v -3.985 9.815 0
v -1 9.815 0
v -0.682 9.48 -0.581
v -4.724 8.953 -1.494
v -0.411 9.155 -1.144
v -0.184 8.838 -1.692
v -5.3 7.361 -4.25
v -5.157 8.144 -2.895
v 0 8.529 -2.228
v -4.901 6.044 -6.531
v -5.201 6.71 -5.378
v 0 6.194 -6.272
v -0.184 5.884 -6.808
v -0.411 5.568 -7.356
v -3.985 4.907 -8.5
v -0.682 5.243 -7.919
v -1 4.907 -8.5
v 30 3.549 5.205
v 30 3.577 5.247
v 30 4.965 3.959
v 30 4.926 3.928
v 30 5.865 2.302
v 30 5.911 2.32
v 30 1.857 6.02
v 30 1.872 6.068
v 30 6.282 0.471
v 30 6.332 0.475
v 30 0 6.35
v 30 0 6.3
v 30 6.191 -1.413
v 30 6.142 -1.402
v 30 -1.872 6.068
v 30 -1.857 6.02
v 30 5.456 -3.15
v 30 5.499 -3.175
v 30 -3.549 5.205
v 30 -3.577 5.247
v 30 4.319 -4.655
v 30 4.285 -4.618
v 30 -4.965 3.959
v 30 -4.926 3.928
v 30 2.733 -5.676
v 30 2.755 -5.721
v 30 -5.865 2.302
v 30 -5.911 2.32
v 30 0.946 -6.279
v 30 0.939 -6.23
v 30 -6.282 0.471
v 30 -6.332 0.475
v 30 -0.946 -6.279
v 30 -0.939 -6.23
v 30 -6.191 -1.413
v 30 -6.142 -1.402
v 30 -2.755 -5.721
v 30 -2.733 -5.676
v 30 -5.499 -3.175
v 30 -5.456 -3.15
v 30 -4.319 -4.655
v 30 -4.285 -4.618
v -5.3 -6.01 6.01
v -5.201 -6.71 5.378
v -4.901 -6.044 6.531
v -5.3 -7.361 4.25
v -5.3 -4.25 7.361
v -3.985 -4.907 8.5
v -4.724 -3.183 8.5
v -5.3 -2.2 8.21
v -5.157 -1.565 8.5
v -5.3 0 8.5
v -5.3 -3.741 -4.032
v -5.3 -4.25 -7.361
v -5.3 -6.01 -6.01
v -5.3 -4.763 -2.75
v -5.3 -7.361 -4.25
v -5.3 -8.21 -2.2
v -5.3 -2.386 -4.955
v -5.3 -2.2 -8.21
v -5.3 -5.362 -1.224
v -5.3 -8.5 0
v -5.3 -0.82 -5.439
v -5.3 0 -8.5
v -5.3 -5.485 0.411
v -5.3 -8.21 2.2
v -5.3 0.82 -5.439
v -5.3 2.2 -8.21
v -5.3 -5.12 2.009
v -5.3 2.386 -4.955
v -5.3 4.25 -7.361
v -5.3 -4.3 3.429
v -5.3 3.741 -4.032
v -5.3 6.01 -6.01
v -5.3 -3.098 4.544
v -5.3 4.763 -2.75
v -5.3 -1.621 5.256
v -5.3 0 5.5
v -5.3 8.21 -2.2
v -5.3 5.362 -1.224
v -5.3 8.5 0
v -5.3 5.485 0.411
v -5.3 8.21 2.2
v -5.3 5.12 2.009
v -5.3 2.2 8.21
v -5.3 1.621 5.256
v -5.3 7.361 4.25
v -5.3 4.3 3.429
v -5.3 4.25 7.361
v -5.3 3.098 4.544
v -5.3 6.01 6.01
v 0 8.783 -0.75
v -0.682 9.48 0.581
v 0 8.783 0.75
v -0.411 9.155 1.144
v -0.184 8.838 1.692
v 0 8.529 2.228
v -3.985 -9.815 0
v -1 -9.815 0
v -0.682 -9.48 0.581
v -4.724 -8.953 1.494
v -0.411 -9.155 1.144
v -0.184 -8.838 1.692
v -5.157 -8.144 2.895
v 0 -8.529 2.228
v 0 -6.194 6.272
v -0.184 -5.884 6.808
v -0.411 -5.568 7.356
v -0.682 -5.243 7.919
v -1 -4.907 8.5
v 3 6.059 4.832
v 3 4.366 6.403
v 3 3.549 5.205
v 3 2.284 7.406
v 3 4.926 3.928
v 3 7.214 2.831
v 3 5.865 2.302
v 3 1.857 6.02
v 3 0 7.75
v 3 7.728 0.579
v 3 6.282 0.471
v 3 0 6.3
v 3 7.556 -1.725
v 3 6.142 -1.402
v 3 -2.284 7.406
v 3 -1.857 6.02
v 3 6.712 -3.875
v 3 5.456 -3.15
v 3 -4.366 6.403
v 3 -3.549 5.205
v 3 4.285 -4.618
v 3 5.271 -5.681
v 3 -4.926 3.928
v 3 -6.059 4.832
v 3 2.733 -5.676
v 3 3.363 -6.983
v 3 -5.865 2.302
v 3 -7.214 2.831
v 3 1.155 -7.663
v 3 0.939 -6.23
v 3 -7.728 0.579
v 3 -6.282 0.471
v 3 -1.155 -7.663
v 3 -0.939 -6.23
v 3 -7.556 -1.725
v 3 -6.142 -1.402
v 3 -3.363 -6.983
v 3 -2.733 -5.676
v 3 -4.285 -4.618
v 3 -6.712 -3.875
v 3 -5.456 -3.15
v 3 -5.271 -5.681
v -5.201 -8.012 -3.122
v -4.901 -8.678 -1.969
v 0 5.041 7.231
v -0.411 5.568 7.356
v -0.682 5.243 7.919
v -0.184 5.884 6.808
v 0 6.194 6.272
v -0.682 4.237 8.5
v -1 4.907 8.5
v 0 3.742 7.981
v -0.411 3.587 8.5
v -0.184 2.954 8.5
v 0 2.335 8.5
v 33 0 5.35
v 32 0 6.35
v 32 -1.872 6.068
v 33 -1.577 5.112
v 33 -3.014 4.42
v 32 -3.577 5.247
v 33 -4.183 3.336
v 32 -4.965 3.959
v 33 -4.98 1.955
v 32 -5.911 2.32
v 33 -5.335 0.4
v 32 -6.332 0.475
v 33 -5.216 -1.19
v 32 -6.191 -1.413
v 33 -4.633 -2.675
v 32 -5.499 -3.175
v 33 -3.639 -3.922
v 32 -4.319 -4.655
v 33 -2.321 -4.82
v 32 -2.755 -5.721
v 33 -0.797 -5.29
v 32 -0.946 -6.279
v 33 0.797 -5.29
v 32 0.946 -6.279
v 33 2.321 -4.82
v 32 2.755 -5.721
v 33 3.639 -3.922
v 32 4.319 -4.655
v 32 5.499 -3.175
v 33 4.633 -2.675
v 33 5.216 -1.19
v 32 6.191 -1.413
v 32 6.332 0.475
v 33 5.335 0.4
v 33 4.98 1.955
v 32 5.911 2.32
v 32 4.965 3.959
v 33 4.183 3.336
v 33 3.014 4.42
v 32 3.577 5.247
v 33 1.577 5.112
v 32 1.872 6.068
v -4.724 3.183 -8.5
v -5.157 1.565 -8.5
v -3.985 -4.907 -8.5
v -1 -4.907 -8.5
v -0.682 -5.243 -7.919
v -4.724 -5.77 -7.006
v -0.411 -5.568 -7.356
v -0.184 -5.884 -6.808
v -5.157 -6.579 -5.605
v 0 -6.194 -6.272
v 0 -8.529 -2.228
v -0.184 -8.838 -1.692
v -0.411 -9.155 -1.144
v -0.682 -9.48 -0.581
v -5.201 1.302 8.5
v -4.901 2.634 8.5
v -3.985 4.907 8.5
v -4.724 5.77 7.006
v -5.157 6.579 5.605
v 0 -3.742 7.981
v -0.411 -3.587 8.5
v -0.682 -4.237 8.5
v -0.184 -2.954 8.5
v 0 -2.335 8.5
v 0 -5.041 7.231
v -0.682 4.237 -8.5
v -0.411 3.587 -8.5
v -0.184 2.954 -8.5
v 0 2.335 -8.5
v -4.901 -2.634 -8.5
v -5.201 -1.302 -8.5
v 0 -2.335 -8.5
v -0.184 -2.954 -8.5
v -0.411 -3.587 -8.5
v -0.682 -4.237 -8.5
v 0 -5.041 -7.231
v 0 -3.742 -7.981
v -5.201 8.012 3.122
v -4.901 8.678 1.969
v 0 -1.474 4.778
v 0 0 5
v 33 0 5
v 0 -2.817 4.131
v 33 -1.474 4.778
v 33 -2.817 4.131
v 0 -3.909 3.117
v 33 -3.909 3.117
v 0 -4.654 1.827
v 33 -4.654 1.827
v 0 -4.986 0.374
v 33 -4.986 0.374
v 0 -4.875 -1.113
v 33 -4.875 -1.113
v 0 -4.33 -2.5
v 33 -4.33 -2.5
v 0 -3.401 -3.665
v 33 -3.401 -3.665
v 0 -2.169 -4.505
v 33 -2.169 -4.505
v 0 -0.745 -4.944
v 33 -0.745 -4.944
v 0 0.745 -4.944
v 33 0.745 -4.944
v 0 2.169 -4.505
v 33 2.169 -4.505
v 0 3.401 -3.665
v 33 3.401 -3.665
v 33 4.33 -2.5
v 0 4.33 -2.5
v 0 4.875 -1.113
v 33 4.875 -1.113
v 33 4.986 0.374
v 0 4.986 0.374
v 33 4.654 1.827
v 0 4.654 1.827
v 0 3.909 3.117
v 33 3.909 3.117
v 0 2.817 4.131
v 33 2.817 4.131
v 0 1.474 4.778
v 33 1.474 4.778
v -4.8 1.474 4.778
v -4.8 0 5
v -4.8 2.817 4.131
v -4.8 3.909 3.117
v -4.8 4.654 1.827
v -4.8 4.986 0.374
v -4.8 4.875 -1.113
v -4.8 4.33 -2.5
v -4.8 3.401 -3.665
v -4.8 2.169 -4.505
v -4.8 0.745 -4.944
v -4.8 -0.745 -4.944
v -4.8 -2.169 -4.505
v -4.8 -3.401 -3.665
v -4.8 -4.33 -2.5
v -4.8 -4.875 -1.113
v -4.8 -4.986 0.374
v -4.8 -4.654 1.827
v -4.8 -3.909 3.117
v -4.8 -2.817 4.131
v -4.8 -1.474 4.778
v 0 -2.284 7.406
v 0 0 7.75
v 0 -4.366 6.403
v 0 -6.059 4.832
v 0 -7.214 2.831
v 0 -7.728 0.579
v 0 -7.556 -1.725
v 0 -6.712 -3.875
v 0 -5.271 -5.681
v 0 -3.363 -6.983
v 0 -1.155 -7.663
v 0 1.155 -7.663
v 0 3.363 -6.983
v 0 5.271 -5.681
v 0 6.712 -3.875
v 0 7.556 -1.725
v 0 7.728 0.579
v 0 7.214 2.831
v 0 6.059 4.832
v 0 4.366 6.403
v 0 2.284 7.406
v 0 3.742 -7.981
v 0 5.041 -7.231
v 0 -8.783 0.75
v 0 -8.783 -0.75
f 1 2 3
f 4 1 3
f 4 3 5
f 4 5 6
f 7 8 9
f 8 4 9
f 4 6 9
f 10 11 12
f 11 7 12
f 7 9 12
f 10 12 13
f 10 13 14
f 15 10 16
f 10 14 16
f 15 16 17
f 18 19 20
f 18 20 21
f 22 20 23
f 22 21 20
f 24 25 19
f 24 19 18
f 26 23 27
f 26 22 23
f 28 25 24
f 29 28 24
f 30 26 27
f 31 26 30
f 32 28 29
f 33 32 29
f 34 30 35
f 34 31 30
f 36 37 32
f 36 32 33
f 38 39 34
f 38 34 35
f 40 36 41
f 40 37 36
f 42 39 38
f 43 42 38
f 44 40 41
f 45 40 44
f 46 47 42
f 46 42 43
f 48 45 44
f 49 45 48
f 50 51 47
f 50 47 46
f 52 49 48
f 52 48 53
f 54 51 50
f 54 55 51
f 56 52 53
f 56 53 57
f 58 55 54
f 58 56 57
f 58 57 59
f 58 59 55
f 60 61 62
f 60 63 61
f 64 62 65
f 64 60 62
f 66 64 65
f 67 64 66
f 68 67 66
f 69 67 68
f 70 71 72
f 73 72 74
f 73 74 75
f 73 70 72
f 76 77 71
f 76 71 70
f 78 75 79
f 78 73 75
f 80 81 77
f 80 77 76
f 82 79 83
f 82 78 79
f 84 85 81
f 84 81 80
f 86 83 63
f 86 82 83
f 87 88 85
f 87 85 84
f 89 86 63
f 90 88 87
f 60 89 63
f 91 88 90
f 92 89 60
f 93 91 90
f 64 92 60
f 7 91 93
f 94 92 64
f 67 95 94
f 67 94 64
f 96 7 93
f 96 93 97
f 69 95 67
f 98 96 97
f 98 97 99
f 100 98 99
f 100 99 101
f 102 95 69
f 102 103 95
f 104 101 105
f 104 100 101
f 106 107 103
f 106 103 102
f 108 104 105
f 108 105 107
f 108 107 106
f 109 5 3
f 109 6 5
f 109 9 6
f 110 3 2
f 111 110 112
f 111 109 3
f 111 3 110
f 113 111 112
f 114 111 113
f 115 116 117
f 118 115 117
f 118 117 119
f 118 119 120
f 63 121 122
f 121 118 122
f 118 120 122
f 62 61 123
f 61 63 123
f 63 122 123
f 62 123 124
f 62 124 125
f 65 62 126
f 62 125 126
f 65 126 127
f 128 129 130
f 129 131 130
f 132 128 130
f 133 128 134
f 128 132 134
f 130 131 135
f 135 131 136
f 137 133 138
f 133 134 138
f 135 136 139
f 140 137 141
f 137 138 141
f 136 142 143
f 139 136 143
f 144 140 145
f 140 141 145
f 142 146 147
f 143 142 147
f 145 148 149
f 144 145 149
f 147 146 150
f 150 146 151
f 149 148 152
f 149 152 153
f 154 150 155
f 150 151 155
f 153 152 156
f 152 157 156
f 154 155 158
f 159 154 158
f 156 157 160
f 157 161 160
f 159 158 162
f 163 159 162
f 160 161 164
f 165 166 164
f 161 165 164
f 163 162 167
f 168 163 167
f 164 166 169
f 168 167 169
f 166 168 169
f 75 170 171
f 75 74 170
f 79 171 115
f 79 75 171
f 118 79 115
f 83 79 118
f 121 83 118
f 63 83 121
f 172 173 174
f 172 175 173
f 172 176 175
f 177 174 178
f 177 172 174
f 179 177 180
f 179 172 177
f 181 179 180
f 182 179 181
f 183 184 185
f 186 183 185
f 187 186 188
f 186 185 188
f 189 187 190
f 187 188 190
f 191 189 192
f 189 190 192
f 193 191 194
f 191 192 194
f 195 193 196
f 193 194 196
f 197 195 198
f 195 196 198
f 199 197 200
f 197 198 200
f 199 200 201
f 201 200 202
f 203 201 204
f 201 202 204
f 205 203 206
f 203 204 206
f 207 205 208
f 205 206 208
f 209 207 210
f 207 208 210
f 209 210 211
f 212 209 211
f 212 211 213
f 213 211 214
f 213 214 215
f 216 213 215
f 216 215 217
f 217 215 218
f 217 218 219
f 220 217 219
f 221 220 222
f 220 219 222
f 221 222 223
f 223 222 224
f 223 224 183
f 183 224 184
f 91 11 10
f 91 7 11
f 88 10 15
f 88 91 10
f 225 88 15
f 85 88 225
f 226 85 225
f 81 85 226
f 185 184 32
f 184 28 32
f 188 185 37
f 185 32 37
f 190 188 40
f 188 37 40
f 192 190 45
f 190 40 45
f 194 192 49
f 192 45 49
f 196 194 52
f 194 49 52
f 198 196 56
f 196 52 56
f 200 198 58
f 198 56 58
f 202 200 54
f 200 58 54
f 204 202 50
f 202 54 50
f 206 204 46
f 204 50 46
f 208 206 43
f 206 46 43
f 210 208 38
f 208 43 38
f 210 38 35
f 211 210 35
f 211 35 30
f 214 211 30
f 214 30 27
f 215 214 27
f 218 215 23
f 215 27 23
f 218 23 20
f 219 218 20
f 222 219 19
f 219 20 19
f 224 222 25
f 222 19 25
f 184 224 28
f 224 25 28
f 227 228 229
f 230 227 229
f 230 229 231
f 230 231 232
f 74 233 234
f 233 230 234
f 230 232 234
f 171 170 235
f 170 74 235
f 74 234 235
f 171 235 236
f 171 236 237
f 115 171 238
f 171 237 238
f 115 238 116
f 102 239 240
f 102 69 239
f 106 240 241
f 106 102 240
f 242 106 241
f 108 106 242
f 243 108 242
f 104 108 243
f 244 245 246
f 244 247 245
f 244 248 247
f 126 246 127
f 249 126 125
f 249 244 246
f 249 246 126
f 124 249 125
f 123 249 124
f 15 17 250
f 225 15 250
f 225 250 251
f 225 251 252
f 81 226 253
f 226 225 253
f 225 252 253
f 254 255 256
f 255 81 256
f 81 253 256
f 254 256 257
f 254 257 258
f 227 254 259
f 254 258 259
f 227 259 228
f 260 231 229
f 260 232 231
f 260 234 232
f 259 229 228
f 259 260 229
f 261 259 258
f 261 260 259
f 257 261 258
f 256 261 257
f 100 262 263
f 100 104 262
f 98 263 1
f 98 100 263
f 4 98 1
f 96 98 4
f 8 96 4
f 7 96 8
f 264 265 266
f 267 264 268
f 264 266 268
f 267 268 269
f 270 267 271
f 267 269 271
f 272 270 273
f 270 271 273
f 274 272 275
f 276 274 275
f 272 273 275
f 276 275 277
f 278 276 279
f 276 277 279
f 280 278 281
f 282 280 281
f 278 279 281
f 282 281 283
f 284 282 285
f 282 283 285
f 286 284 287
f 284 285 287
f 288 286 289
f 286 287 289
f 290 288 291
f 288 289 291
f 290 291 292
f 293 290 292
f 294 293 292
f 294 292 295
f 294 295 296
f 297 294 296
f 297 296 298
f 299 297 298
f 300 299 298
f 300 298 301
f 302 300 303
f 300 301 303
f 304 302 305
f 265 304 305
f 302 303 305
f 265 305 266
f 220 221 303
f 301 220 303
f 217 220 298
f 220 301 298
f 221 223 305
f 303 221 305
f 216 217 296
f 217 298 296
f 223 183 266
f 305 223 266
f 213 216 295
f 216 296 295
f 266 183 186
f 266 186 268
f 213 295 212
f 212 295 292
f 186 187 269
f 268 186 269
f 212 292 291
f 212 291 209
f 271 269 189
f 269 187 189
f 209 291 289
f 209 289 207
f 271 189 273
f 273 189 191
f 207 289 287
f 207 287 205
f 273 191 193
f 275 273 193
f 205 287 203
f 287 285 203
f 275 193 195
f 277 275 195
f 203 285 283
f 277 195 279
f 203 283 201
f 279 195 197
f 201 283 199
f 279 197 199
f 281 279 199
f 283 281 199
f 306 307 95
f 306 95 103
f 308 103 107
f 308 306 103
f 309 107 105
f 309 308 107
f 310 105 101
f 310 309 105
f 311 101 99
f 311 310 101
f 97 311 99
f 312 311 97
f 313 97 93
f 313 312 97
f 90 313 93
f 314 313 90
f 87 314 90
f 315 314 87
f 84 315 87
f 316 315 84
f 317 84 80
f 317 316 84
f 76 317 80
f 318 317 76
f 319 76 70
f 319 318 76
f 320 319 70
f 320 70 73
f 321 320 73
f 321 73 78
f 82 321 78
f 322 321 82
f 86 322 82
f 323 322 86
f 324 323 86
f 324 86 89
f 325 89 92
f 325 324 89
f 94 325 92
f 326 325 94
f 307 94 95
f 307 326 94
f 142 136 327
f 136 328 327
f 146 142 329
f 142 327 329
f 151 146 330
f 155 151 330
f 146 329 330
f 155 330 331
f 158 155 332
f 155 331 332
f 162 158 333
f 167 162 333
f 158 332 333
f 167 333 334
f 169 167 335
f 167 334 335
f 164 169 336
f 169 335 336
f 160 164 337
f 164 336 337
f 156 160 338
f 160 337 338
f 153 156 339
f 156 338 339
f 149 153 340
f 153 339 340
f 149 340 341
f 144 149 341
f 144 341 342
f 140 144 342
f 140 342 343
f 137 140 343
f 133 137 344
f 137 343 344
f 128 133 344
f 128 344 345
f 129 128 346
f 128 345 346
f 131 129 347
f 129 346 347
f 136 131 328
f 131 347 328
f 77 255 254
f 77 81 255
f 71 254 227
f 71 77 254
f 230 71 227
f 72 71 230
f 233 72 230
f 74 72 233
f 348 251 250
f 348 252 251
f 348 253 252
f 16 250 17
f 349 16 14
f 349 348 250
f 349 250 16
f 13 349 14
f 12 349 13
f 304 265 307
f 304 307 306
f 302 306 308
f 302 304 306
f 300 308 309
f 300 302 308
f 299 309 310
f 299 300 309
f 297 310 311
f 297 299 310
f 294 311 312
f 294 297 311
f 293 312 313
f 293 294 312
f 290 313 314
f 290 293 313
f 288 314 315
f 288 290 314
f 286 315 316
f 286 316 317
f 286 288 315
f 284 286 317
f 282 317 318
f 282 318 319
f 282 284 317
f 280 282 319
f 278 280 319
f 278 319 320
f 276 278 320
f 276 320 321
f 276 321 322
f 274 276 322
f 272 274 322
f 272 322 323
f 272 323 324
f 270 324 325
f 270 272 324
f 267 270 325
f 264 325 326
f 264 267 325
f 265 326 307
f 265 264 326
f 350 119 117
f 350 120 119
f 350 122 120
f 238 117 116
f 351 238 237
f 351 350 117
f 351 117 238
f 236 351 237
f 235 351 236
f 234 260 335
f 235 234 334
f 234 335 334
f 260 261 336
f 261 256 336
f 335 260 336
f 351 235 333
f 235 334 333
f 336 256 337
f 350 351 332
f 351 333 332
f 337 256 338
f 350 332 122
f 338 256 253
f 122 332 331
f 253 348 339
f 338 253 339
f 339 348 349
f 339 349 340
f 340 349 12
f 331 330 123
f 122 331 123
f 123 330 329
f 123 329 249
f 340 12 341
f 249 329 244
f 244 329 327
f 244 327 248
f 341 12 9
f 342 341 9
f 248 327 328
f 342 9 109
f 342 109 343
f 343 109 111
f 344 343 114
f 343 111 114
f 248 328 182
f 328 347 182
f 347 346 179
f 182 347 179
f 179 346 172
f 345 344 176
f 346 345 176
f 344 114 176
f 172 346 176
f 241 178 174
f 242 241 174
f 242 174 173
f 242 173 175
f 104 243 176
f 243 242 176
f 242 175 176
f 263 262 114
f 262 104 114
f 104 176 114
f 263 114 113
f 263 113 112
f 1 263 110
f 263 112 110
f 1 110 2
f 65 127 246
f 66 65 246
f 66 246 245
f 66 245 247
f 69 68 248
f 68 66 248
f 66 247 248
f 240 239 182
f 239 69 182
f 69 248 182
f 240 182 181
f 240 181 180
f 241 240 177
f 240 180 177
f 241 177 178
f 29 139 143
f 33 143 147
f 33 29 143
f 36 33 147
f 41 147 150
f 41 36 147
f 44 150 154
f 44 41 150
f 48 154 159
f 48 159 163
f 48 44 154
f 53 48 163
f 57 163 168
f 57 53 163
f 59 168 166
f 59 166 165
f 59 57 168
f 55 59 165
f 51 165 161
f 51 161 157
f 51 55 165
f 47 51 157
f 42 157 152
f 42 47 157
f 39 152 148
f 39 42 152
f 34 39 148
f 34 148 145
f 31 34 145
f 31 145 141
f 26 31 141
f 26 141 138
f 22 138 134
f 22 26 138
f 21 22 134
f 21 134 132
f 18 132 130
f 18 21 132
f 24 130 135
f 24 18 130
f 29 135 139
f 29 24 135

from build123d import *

# Parameters (mm, degrees)
SFAZOWANIE2_SIZE            = 1
SZKIC2_W                    = 27
SZKIC2_H                    = 0.05
SZKIC3_R                    = 5
DODANIE_WYCI_GNI_CIE1_DEPTH = 5.3
SFAZOWANIE3_SIZE            = 0.5


with BuildPart() as part:
    # Szkic1 → Obrót1 (revolve)
    with BuildSketch(Plane.XY, mode=Mode.PRIVATE) as obr_t1_sk:
        Polygon((0, 5), (33, 5), (33, 6.35), (3, 6.35), (3, 7.75), (0, 7.75), align=None)
    revolve(obr_t1_sk.sketch.rotate(Axis((0, 0, 0), (1, 0, 0)), 90), axis=Axis((0, 0, 0), (1, 0, 0)))

    # Sfazowanie2
    sfazowanie2_edges = [part.edges().sort_by_distance(p)[0] for p in [
        (33, 0, -6.35),
    ]]
    chamfer(sfazowanie2_edges, length=SFAZOWANIE2_SIZE)

    # Szkic2 → Wycięcie-obrót1 (revolve, cut)
    with BuildSketch(Plane.XY, mode=Mode.PRIVATE) as wyci_cie_obr_t1_sk:
        with Locations((16.5, 6.325)):
            Rectangle(SZKIC2_W, SZKIC2_H)
    revolve(wyci_cie_obr_t1_sk.sketch.rotate(Axis((3, 0, 0), (1, 0, 0)), 90), axis=Axis((3, 0, 0), (1, 0, 0)), mode=Mode.SUBTRACT)

    # Szkic3 → Dodanie-wyciągnięcie1 (add)
    with BuildSketch(Plane.ZY):
        Polygon((8.5, -4.907477288), (8.5, 4.907477288), (0, 9.814954576), (-8.5, 4.907477288), (-8.5, -4.907477288), (0, -9.814954576), align=None)
        Circle(SZKIC3_R, mode=Mode.SUBTRACT)
    extrude(amount=DODANIE_WYCI_GNI_CIE1_DEPTH)

    # Szkic4 → Wycięcie-obrót2 (revolve, cut)
    with BuildSketch(Plane(origin=(0, 0, 0), x_dir=(1, 0, 0), z_dir=(0, 1, 0)), mode=Mode.PRIVATE) as wyci_cie_obr_t2_sk:
        Polygon((-5.3, 8.5), (-5.3, 12), (-1.8, 12), align=None)
    revolve(wyci_cie_obr_t2_sk.sketch.rotate(Axis((0, 0, 0), (-1, 0, 0)), 180), axis=Axis((0, 0, 0), (-1, 0, 0)), mode=Mode.SUBTRACT)

    # Szkic5 → Wycięcie-obrót3 (revolve, cut)
    with BuildSketch(Plane.XY, mode=Mode.PRIVATE) as wyci_cie_obr_t3_sk:
        Polygon((0, -8.814954576), (0, -9.814954576), (-1, -9.814954576), align=None)
    revolve(wyci_cie_obr_t3_sk.sketch.rotate(Axis((0, 0, 0), (1, 0, 0)), 270), axis=Axis((0, 0, 0), (1, 0, 0)), mode=Mode.SUBTRACT)

    # Sfazowanie3
    sfazowanie3_edges = [part.edges().sort_by_distance(p)[0] for p in [
        (-5.3, 0, -5),
    ]]
    chamfer(sfazowanie3_edges, length=SFAZOWANIE3_SIZE)


solid = part.part
